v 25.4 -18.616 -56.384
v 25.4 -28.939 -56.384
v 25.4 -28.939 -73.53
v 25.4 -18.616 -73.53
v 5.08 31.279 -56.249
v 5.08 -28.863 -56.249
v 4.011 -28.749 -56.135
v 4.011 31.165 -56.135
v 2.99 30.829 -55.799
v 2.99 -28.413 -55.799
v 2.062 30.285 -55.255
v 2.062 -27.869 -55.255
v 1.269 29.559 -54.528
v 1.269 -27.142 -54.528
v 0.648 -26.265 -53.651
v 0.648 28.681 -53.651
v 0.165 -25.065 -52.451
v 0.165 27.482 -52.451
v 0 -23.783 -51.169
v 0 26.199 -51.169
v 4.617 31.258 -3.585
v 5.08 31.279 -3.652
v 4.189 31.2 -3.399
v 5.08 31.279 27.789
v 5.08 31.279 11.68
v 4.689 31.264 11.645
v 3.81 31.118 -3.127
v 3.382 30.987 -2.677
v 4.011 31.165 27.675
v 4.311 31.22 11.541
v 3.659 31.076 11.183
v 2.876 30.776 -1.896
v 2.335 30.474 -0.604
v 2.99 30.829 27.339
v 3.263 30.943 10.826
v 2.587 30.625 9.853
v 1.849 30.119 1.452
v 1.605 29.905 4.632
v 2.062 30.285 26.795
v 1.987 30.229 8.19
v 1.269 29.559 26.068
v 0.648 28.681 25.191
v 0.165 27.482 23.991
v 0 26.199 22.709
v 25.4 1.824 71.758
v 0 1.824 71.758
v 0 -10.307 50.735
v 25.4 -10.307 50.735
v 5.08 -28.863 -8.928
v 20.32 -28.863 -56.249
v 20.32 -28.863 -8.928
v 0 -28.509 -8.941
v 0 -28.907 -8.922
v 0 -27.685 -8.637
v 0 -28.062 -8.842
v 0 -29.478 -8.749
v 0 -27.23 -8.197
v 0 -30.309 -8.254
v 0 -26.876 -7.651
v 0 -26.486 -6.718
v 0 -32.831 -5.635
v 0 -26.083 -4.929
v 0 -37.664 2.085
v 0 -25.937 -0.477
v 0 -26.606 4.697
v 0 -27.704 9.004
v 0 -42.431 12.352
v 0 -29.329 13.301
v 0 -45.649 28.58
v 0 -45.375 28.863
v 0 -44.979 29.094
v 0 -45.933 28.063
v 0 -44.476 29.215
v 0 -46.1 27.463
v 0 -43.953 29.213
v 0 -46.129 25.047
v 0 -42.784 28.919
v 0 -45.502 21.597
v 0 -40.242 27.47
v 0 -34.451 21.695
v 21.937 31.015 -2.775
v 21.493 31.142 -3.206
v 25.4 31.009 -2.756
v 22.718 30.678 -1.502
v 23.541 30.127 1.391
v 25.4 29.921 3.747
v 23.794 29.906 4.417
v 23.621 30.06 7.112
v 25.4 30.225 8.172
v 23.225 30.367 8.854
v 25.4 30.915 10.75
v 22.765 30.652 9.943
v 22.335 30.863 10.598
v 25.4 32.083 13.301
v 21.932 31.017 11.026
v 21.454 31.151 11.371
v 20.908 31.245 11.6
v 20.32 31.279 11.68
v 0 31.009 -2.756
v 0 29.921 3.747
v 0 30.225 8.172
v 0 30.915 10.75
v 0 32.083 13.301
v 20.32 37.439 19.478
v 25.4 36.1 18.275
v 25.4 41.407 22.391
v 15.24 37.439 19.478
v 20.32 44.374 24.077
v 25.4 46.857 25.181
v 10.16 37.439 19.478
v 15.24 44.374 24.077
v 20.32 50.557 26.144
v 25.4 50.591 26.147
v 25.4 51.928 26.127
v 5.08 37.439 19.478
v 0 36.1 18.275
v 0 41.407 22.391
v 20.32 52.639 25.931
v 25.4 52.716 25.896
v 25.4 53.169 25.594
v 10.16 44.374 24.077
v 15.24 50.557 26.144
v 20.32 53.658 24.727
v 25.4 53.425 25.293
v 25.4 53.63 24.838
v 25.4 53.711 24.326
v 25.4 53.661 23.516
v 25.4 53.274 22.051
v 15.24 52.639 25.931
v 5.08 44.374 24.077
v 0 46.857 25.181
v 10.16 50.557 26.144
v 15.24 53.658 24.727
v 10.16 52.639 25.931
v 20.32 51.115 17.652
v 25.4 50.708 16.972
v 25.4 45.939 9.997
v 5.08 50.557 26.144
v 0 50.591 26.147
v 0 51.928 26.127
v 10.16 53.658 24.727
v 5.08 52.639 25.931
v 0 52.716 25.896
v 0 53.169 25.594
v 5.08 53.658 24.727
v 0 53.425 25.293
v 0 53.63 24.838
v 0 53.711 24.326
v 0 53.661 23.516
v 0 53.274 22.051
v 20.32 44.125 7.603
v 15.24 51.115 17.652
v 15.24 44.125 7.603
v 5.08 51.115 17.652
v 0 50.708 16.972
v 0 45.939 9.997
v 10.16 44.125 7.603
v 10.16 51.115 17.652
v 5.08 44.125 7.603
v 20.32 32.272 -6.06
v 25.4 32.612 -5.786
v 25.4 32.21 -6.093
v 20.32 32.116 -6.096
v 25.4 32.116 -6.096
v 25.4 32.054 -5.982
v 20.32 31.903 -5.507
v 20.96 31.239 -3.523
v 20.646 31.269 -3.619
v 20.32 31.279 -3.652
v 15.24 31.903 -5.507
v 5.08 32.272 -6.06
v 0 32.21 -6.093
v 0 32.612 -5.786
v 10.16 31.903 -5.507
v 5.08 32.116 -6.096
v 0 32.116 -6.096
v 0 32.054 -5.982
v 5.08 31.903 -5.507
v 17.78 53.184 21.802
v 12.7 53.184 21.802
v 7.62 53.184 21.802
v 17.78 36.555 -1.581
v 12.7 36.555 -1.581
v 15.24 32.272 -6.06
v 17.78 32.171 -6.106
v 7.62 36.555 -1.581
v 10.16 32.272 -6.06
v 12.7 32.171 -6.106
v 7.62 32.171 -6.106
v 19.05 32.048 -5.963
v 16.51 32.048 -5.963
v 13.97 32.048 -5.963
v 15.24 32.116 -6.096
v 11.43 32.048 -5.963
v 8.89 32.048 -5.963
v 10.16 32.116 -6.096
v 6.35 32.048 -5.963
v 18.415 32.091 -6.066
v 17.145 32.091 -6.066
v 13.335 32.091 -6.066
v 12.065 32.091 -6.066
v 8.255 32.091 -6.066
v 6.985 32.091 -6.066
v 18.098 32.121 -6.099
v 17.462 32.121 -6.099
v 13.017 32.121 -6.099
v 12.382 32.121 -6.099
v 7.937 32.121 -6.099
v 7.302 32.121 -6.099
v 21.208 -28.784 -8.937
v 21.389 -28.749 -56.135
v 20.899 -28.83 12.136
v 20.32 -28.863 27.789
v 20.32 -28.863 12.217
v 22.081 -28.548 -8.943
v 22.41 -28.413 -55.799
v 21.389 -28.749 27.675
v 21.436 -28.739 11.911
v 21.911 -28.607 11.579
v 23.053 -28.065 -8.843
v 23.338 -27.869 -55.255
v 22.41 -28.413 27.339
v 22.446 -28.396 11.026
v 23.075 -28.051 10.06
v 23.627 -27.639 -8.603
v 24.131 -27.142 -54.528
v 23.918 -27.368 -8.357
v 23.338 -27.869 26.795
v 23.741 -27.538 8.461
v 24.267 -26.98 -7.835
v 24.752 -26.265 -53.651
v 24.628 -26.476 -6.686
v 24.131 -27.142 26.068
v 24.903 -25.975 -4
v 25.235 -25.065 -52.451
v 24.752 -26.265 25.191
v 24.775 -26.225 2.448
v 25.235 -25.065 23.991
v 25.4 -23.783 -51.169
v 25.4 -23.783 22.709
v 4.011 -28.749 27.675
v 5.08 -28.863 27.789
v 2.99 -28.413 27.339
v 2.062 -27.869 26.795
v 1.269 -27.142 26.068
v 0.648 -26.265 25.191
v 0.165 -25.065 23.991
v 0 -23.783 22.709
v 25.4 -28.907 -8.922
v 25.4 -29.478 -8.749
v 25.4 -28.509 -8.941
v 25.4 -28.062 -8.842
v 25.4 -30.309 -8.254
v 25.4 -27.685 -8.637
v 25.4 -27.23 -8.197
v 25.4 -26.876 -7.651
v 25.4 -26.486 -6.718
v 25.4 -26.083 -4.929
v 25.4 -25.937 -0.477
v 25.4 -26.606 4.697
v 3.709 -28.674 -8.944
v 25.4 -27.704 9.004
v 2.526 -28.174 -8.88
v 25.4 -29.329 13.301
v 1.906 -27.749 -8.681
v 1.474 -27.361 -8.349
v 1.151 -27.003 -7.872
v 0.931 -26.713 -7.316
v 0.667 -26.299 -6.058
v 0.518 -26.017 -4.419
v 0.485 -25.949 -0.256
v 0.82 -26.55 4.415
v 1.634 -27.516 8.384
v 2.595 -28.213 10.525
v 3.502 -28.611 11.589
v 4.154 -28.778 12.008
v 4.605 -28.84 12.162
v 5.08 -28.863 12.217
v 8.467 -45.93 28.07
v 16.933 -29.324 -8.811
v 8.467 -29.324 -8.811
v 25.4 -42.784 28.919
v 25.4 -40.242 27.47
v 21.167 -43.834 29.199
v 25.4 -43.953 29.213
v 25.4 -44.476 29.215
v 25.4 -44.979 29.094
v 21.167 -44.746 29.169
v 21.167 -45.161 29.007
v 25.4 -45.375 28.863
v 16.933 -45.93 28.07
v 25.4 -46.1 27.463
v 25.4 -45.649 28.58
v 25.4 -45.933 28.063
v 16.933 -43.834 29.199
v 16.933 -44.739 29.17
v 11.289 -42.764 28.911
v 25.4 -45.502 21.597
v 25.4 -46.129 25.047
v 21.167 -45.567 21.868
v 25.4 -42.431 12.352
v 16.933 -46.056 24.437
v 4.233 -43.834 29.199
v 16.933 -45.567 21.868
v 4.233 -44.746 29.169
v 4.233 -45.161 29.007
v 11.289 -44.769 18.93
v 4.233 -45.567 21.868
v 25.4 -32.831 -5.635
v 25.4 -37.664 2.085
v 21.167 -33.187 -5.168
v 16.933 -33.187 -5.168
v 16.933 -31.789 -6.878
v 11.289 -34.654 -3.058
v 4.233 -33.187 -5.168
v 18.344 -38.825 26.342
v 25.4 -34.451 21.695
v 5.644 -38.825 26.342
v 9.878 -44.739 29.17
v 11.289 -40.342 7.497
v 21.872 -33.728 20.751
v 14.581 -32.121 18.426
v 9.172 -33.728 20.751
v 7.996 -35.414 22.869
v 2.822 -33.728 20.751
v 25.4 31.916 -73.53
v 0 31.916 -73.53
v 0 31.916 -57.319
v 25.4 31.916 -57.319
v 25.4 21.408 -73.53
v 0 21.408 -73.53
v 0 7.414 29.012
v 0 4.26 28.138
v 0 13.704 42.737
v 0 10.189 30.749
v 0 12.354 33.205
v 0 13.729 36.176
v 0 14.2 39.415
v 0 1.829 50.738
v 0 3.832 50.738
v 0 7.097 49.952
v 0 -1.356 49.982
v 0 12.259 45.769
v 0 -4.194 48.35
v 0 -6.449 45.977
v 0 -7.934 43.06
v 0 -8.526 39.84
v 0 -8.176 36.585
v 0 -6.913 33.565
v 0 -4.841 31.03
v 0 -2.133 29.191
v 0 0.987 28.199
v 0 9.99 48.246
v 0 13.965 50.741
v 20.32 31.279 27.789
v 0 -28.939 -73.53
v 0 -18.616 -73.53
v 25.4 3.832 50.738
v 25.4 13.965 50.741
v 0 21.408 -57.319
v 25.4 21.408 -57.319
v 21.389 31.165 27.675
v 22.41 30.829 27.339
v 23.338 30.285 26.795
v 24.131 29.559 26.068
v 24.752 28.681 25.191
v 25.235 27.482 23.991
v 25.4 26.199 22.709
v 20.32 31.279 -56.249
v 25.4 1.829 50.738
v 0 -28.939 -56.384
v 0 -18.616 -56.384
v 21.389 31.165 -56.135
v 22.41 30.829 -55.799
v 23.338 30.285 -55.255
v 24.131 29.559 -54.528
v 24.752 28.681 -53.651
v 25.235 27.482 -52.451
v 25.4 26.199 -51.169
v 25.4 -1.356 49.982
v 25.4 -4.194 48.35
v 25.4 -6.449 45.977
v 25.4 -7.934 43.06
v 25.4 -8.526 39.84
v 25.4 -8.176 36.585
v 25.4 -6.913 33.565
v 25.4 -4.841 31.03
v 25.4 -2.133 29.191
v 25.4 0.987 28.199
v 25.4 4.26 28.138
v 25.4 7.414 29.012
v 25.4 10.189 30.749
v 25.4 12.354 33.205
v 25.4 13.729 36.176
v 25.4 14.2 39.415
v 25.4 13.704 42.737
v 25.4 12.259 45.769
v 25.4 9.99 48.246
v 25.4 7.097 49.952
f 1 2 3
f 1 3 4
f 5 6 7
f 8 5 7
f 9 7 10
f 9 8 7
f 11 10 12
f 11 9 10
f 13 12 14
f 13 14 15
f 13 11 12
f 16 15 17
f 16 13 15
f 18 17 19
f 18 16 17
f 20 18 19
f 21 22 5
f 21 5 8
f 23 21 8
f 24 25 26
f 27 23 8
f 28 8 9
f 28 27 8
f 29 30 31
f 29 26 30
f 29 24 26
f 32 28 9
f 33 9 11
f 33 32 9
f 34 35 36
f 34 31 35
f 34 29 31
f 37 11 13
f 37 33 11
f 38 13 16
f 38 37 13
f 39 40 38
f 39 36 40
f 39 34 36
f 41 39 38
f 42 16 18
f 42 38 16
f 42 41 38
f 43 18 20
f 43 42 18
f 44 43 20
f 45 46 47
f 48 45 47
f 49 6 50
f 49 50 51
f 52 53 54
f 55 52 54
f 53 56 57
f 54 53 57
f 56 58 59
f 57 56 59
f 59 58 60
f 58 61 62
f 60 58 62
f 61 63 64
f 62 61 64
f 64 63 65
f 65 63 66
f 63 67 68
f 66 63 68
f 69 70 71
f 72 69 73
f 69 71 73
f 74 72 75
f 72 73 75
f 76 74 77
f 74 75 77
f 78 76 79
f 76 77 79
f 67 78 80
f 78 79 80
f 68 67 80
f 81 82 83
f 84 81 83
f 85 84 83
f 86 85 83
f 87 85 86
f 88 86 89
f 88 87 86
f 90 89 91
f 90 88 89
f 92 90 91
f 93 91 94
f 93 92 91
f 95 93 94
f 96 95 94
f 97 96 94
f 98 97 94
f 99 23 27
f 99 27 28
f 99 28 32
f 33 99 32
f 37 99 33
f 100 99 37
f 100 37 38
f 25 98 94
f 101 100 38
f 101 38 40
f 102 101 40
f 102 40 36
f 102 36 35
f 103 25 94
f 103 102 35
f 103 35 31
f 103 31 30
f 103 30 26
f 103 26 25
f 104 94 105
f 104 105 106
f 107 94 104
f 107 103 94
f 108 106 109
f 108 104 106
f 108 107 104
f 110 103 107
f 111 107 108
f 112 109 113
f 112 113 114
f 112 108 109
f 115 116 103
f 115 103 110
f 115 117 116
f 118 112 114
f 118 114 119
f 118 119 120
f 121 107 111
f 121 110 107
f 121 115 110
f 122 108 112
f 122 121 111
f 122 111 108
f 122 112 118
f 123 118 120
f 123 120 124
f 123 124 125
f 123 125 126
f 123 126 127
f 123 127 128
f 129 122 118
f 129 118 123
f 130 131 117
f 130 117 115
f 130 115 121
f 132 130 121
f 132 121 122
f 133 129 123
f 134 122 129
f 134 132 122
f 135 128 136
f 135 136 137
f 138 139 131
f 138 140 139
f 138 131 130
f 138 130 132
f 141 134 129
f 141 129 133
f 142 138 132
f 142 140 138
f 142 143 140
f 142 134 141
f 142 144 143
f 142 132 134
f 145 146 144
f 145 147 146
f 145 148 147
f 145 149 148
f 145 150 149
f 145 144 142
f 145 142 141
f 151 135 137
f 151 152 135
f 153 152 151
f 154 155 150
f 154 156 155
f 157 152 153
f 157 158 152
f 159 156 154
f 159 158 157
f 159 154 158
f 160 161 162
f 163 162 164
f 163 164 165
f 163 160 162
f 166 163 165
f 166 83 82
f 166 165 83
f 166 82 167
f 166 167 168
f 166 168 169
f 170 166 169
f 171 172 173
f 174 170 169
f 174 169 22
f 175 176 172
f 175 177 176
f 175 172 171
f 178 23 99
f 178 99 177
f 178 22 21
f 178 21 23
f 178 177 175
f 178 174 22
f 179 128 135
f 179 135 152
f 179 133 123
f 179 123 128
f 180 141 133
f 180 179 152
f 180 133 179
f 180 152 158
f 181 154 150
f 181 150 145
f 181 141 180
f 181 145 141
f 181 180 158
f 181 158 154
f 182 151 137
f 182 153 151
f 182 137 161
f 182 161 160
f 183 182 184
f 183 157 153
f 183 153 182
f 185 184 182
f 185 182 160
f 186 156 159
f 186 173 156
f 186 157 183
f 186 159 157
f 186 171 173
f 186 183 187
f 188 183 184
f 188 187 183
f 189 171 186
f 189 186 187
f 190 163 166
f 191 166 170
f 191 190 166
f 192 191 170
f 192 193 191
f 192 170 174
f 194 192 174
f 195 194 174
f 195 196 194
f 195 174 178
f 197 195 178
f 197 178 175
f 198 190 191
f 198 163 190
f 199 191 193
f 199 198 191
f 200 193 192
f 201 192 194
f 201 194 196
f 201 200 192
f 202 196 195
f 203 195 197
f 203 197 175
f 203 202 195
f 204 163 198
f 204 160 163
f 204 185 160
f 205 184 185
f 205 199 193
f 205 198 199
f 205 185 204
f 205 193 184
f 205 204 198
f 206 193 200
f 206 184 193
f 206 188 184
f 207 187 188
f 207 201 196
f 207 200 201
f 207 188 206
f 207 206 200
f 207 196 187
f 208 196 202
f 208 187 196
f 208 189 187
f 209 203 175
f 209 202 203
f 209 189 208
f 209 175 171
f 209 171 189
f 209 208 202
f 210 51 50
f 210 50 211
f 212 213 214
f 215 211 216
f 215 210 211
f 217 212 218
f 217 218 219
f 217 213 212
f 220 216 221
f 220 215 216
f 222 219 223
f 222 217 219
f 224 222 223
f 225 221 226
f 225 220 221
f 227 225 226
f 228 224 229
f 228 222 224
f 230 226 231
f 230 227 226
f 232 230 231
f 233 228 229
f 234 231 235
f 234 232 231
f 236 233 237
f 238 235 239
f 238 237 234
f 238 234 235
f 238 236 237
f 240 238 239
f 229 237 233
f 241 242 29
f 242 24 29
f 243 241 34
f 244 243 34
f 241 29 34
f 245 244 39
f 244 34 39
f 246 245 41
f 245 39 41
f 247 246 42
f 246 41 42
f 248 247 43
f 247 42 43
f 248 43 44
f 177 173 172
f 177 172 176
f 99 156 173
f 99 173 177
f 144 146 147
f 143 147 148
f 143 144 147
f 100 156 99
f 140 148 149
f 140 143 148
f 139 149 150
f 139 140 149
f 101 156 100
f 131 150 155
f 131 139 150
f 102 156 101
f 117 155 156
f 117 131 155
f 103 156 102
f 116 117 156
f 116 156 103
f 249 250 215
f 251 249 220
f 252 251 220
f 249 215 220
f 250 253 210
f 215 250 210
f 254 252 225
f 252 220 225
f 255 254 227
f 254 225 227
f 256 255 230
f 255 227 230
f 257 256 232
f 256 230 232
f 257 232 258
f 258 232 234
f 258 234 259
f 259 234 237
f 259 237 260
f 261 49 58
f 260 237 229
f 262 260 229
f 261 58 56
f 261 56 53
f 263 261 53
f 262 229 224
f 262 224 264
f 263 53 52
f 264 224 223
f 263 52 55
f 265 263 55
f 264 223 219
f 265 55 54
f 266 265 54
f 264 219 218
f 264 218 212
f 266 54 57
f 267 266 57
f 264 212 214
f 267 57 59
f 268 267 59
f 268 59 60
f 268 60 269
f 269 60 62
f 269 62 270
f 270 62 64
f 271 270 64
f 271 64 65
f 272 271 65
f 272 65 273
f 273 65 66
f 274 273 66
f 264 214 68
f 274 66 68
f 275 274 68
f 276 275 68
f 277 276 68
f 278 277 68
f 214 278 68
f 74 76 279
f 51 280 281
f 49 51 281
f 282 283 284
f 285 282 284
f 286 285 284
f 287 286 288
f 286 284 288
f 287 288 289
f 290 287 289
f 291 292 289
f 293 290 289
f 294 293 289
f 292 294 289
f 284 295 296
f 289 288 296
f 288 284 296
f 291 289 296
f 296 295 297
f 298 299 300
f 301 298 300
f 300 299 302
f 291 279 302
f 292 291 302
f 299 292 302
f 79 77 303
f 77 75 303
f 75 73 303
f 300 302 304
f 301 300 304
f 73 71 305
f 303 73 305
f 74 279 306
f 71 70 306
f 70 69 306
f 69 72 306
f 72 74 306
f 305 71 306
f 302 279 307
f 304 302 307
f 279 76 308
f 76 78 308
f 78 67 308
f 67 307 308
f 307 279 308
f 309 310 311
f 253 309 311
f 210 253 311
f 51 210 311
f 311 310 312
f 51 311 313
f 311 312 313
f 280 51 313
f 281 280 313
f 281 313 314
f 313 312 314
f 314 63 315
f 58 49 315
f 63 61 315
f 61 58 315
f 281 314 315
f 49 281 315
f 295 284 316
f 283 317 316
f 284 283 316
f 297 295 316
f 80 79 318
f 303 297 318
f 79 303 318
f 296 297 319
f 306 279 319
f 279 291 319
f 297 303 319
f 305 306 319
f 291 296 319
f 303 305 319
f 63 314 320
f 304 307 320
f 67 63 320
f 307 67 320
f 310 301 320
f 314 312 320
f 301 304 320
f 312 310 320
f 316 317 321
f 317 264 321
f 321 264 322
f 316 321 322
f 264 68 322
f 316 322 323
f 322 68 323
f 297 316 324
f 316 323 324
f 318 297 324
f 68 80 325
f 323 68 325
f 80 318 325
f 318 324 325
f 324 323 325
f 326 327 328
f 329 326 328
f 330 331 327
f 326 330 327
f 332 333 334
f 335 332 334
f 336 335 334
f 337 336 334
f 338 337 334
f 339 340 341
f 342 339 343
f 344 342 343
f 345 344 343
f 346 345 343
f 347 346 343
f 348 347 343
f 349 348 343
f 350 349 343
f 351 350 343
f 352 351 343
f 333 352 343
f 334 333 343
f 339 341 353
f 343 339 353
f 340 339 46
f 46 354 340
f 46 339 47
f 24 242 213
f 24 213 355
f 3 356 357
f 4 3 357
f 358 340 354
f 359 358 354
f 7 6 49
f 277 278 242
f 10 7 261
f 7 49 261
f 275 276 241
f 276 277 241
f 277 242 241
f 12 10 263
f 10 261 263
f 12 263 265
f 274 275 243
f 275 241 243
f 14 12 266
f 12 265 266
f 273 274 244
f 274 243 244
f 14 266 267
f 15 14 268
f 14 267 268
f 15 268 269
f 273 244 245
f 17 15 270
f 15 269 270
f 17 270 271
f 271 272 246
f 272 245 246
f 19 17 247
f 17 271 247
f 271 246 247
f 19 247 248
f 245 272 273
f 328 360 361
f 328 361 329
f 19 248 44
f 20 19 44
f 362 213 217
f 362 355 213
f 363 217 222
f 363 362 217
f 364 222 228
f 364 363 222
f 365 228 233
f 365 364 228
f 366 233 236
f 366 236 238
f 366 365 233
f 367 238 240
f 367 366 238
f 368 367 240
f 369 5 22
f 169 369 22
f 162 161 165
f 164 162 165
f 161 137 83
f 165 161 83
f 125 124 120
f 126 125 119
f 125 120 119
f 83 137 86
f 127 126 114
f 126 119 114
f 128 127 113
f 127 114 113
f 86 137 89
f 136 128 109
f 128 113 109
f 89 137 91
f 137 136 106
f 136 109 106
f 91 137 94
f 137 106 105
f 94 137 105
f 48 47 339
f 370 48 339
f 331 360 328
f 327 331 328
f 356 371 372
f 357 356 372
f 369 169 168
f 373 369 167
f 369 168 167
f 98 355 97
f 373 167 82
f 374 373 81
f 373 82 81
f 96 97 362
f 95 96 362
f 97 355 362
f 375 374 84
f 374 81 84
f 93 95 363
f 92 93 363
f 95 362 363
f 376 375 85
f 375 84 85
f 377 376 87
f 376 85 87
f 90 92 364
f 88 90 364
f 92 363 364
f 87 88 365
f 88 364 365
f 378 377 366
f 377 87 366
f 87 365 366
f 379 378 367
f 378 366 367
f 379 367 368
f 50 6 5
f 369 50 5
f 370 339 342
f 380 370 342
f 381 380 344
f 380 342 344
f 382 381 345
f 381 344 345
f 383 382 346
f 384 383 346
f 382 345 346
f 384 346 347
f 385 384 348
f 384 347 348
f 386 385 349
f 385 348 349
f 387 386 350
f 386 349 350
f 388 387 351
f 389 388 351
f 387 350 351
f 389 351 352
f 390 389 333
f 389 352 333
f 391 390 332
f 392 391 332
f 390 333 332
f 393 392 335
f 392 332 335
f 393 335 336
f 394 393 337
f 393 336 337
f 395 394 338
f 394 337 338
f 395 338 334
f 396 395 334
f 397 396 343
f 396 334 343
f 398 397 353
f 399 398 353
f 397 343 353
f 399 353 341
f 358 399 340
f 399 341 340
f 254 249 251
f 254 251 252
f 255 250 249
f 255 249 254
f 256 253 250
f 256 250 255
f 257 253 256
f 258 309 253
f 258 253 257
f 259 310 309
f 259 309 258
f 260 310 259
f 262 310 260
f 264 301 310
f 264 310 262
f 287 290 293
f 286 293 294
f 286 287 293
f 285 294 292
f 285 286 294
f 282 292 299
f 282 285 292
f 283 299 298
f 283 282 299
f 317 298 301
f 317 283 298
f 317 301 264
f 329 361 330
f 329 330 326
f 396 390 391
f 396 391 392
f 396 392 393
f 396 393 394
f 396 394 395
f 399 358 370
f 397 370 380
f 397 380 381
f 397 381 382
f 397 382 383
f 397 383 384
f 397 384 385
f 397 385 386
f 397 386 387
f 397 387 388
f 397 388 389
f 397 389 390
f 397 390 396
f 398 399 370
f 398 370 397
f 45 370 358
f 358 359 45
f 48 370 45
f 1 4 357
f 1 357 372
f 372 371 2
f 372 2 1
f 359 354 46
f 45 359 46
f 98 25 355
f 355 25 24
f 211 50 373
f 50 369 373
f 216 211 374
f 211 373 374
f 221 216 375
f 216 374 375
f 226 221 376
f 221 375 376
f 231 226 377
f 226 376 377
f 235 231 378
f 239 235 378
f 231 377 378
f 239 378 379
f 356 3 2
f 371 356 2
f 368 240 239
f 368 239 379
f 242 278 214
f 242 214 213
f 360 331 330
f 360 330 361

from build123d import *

# Parameters (mm, degrees)
F0_W     = 60.14174968
F0_H     = 84.0373504907
F1_DEPTH = 25.4
F2_R     = 5.08
F4_DEPTH = 25.4
F3_W     = 10.323472321
F3_H     = 17.1452686191
F3_W_2   = 10.5081591755
F3_H_2   = 16.2112154067


with BuildPart() as f1:
    # F0 (on Right) → F1 (new body)
    with BuildSketch(Plane.YZ):
        with Locations((1.208204776, -14.2299672589)):
            Rectangle(F0_W, F0_H)
    extrude(amount=F1_DEPTH)

    # F2
    f2_edges = [f1.edges().sort_by_distance(p)[0] for p in [
        (25.4, -28.86267, -14.229967),
        (25.4, 31.27908, -14.229967),
        (25.4, 1.208205, 27.788708),
        (25.4, 1.208205, -56.248643),
        (0, 1.208205, 27.788708),
        (0, 1.208205, -56.248643),
        (0, -28.86267, -14.229967),
        (0, 31.27908, -14.229967),
    ]]
    fillet(f2_edges, radius=F2_R)

    # F3 (on Right) → F4, piece 2 (join)
    with BuildSketch(Plane.YZ):
        with BuildLine():
            add(Edge.make_bspline(
                [(32.0832654834, 13.3006237447), (37.1350025845, 22.1651735744), (71.7972655913, 38.2817954591), (32.6090807303, -6.6076622341), (32.0557738888, -6.0476674376), (31.8831818454, -5.1407847372), (27.6492685405, 5.5200551882), (32.0832654834, 13.3006237447)],
                knots=[0, 0, 0, 0, 0.2977686116, 0.6667420328, 0.6926219109, 0.7386433444, 1, 1, 1, 1], degree=3))
        make_face()
        with BuildLine():
            add(Edge.make_bspline(
                [(-29.3288361281, 13.3006237447), (-34.1437815008, 24.0144247731), (-57.8567970473, 43.6732991453), (-25.5848649951, -28.0194473703), (-24.5257305741, 2.6131676594), (-29.3288361281, 13.3006237447)],
                knots=[0, 0, 0, 0, 0.2988005884, 0.7019341541, 1, 1, 1, 1], degree=3))
        make_face()
    extrude(amount=F4_DEPTH)


with BuildPart() as f4:
    # F3 (on Right) → F4 (new body)
    with BuildSketch(Plane.YZ):
        with BuildLine():
            ThreePointArc((1.8291913439, 50.7379062474), (-4.8412992389, 31.0301338793), (14.2002509804, 39.4153054084))
            ThreePointArc((14.2002509804, 39.4153054084), (11.2165499413, 47.0918388166), (3.8318141288, 50.7383870528))
            Line((3.8318141288, 50.7383870528), (1.8291913439, 50.7379062474))
        make_face()
        with BuildLine():
            Line((1.8291913439, 50.7379062474), (3.8318141288, 50.7383870528))
            ThreePointArc((3.8318141288, 50.7383870528), (2.8304921273, 50.7823348484), (1.8291913439, 50.7379062474))
        make_face()
        with BuildLine():
            ThreePointArc((1.8291913439, 50.7379062474), (2.8304921273, 50.7823348484), (3.8318141288, 50.7383870528))
            Line((3.8318141288, 50.7383870528), (13.9649923015, 50.7408199057))
            Line((13.9649923015, 50.7408199057), (1.8241447397, 71.7577300966))
            Line((1.8241447397, 71.7577300966), (-10.3066096138, 50.7349925891))
            Line((-10.3066096138, 50.7349925891), (1.8291913439, 50.7379062474))
        make_face()
    extrude(amount=F4_DEPTH)


with BuildPart() as f4b:
    # F3 (on Right) → F4, piece 3 (new body)
    with BuildSketch(Plane.YZ):
        with Locations((-23.7775798887, -64.9571232498)):
            Rectangle(F3_W, F3_H)
    extrude(amount=F4_DEPTH)


with BuildPart() as f4c:
    # F3 (on Right) → F4, piece 4 (new body)
    with BuildSketch(Plane.YZ):
        with Locations((26.6617229208, -65.424149856)):
            Rectangle(F3_W_2, F3_H_2)
    extrude(amount=F4_DEPTH)


solid = Compound([f1.part, f4.part, f4b.part, f4c.part])
